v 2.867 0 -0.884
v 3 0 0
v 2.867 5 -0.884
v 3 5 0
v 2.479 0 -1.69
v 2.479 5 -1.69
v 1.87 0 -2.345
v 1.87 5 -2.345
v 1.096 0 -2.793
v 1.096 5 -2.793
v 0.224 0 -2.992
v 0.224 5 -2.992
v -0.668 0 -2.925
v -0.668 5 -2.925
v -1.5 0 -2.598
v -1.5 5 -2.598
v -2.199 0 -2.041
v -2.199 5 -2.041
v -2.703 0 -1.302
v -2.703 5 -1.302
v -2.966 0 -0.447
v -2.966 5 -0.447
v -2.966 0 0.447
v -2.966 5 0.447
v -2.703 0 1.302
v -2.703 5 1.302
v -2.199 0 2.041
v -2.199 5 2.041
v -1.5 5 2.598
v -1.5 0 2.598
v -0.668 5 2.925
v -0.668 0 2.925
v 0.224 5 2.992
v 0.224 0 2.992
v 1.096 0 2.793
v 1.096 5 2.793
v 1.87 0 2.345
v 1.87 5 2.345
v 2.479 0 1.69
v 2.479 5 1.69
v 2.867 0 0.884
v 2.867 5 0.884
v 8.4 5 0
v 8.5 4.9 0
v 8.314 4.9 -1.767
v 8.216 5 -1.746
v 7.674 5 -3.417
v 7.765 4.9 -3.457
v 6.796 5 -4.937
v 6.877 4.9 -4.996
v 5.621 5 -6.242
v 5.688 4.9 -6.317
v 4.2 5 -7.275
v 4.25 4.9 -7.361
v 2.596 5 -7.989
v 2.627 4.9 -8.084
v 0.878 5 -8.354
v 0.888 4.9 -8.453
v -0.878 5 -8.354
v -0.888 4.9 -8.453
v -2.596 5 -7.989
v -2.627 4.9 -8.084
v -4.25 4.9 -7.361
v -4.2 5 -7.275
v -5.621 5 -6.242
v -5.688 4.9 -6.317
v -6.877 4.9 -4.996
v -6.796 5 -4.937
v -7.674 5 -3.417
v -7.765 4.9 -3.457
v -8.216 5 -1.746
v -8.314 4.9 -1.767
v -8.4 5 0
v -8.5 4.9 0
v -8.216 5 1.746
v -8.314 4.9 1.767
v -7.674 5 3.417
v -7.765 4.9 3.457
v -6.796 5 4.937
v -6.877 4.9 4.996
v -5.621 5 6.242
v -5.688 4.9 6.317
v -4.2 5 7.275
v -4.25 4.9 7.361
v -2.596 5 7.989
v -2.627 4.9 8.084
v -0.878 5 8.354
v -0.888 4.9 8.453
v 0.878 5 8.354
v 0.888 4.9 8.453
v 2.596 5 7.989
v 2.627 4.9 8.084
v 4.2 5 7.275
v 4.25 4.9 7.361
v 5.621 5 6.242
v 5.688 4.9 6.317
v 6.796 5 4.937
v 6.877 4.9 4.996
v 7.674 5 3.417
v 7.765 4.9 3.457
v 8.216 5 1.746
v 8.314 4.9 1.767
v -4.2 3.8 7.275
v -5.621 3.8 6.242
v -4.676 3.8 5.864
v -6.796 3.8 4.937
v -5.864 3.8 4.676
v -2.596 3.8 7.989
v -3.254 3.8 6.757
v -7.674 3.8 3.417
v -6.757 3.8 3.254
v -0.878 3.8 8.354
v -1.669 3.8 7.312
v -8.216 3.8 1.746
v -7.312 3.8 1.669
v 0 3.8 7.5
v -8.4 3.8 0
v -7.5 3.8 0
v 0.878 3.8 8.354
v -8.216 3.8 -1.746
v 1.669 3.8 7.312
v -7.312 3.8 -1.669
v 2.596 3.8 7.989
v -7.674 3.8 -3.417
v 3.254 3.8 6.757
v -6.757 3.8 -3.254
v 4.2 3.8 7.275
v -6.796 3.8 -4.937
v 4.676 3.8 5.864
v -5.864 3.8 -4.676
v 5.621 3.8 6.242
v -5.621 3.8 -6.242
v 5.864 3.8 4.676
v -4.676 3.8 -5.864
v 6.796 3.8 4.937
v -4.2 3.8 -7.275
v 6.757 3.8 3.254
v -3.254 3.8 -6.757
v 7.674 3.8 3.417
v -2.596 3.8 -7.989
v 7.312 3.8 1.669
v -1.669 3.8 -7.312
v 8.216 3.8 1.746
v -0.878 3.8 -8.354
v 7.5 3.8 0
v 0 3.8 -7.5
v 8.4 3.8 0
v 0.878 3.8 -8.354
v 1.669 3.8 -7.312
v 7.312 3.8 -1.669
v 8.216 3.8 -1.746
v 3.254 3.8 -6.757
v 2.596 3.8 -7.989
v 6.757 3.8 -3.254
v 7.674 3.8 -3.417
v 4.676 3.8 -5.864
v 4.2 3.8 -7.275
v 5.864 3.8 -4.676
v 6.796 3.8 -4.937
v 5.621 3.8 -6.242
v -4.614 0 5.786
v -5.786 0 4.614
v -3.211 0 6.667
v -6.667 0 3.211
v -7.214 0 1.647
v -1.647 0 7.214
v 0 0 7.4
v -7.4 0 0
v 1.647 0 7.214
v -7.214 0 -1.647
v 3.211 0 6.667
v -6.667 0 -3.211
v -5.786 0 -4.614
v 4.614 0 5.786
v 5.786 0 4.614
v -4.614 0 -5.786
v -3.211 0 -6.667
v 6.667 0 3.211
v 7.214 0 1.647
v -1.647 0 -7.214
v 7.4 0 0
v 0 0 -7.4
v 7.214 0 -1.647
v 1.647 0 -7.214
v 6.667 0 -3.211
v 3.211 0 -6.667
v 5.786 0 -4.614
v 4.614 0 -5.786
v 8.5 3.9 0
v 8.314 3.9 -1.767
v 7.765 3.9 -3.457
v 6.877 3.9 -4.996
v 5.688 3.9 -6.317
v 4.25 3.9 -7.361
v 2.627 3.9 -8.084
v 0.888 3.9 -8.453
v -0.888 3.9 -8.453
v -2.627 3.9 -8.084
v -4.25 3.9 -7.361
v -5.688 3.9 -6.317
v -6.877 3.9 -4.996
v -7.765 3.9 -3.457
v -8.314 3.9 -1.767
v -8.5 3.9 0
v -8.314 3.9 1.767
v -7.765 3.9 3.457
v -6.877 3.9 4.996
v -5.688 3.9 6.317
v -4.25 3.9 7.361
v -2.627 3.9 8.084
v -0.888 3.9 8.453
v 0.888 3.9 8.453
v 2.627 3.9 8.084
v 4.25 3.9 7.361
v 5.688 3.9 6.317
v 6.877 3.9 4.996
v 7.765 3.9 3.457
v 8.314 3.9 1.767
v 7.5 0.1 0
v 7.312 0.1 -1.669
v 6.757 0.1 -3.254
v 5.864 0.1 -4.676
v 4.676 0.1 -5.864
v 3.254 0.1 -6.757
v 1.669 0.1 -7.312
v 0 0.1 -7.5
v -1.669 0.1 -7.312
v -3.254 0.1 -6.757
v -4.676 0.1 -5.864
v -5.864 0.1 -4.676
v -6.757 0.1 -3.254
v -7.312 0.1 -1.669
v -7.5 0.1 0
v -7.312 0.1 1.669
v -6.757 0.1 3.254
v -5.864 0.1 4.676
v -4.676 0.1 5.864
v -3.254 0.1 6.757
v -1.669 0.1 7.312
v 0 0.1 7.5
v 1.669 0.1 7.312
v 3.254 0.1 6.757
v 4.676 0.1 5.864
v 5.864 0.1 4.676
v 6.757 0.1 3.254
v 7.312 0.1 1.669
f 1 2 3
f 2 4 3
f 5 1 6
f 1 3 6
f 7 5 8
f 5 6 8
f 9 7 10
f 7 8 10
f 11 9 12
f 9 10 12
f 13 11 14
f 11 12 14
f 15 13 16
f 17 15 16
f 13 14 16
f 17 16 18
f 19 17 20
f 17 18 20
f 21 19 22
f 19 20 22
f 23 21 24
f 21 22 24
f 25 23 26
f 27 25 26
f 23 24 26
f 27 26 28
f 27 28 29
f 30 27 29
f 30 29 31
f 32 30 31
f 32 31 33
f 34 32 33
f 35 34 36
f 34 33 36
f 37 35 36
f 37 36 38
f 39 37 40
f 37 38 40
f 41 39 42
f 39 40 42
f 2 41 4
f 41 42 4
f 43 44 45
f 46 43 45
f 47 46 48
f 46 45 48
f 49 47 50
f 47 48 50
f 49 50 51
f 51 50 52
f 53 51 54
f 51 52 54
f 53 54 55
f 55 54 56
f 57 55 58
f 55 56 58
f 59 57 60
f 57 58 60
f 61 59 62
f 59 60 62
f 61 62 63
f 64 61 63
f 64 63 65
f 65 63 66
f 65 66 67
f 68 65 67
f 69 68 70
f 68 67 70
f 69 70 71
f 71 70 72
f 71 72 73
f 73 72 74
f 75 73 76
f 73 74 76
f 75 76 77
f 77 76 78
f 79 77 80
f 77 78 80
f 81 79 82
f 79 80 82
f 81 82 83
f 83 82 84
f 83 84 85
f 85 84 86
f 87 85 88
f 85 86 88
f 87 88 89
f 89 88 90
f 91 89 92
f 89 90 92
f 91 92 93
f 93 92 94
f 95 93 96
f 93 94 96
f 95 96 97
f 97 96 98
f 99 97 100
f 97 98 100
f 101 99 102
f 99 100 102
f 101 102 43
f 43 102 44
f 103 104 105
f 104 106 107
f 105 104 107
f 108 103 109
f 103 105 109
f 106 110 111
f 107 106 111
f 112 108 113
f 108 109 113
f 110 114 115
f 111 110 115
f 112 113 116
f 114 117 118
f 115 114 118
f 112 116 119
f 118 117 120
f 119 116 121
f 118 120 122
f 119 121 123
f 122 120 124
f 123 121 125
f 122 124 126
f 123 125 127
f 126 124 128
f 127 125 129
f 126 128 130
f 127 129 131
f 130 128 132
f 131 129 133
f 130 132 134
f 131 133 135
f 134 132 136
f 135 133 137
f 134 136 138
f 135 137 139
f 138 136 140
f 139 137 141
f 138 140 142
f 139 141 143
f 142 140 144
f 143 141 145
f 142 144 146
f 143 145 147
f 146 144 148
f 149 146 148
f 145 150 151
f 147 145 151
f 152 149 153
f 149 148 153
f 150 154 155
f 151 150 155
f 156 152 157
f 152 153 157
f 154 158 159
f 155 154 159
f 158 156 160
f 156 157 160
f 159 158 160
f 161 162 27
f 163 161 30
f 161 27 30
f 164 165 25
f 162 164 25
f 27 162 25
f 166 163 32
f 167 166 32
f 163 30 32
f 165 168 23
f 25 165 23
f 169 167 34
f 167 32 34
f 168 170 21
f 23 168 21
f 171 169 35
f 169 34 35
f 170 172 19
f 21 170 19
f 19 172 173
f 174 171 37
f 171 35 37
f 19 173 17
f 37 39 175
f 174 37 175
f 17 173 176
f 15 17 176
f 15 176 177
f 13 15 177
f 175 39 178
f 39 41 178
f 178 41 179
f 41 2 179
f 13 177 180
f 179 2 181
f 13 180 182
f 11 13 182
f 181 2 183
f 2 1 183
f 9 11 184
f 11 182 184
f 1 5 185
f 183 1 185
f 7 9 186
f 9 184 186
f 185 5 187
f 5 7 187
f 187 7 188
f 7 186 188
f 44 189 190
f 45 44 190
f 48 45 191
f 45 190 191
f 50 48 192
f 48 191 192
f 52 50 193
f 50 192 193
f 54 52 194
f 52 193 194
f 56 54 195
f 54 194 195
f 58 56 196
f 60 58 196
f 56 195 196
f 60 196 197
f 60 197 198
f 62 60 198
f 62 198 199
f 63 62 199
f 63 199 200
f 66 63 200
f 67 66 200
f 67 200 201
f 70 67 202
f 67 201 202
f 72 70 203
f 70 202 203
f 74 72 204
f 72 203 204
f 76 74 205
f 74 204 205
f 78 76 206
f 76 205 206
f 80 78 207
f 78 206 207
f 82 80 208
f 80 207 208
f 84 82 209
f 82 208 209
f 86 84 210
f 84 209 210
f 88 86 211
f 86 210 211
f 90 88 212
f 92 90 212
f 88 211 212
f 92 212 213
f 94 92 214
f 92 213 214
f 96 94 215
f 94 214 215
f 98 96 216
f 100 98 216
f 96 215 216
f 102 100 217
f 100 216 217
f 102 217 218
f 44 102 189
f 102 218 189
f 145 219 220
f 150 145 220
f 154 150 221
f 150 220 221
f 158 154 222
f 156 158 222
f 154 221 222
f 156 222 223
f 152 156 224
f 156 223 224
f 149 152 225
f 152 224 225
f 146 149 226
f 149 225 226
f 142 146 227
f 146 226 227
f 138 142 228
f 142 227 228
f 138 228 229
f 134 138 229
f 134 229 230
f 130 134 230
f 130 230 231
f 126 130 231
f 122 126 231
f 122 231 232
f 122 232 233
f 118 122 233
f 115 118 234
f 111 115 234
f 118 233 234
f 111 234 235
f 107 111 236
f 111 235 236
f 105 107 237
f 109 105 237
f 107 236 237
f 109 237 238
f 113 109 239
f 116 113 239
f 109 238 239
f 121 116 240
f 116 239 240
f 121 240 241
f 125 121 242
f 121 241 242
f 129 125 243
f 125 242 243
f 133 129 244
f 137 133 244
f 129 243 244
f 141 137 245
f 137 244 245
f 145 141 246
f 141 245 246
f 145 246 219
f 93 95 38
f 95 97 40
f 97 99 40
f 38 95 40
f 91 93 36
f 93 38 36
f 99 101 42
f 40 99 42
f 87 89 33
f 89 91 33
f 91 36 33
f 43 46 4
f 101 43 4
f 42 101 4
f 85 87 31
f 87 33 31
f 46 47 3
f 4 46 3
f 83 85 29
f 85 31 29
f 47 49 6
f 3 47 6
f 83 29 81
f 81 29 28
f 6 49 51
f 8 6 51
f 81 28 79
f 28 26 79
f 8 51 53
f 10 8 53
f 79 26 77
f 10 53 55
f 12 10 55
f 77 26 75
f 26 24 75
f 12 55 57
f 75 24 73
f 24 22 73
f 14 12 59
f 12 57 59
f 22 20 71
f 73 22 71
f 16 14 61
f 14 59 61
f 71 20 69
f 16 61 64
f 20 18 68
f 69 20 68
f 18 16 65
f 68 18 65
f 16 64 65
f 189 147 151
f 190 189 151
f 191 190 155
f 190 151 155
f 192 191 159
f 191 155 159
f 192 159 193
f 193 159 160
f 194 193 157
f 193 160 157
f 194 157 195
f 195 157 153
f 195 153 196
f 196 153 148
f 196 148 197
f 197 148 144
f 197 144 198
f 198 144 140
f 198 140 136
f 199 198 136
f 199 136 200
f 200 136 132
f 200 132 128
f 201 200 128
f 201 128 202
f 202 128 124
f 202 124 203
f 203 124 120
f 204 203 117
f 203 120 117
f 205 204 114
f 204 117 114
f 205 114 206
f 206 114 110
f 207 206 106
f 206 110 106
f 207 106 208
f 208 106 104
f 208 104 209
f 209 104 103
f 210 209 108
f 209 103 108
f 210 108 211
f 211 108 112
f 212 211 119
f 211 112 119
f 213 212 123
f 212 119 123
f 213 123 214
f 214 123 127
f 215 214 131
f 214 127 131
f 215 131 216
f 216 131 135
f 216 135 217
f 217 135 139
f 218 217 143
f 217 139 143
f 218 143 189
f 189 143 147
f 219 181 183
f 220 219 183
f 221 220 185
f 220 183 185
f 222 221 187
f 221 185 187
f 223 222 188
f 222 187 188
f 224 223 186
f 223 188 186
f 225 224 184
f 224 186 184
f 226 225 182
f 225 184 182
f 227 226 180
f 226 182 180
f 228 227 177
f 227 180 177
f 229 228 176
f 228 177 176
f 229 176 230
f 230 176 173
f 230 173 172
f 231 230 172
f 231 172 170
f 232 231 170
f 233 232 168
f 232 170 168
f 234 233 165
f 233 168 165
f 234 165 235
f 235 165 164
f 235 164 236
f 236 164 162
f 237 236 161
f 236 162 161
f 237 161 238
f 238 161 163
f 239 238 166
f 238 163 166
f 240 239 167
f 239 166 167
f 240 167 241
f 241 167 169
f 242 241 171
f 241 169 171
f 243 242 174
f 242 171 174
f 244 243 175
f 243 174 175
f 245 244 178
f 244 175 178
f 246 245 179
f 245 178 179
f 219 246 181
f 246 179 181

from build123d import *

# Parameters (mm, degrees)
CHAMFER_1_SIZE = 0.1


with BuildPart() as part:
    # 草图1 → 旋转1 (revolve)
    with BuildSketch(Plane.XY):
        Polygon((3, 0), (3, 5), (8.5, 5), (8.5, 3.8), (7.5, 3.8), (7.5, 0), align=None)
    revolve(axis=Axis((0, 0, 0), (0, 1, 0)))

    # 倒角1
    chamfer_1_edges = [part.edges().sort_by_distance(p)[0] for p in [
        (-7.5, 0, 0),
        (-8.5, 3.8, 0),
        (-8.5, 5, 0),
    ]]
    chamfer(chamfer_1_edges, length=CHAMFER_1_SIZE)


solid = part.part
